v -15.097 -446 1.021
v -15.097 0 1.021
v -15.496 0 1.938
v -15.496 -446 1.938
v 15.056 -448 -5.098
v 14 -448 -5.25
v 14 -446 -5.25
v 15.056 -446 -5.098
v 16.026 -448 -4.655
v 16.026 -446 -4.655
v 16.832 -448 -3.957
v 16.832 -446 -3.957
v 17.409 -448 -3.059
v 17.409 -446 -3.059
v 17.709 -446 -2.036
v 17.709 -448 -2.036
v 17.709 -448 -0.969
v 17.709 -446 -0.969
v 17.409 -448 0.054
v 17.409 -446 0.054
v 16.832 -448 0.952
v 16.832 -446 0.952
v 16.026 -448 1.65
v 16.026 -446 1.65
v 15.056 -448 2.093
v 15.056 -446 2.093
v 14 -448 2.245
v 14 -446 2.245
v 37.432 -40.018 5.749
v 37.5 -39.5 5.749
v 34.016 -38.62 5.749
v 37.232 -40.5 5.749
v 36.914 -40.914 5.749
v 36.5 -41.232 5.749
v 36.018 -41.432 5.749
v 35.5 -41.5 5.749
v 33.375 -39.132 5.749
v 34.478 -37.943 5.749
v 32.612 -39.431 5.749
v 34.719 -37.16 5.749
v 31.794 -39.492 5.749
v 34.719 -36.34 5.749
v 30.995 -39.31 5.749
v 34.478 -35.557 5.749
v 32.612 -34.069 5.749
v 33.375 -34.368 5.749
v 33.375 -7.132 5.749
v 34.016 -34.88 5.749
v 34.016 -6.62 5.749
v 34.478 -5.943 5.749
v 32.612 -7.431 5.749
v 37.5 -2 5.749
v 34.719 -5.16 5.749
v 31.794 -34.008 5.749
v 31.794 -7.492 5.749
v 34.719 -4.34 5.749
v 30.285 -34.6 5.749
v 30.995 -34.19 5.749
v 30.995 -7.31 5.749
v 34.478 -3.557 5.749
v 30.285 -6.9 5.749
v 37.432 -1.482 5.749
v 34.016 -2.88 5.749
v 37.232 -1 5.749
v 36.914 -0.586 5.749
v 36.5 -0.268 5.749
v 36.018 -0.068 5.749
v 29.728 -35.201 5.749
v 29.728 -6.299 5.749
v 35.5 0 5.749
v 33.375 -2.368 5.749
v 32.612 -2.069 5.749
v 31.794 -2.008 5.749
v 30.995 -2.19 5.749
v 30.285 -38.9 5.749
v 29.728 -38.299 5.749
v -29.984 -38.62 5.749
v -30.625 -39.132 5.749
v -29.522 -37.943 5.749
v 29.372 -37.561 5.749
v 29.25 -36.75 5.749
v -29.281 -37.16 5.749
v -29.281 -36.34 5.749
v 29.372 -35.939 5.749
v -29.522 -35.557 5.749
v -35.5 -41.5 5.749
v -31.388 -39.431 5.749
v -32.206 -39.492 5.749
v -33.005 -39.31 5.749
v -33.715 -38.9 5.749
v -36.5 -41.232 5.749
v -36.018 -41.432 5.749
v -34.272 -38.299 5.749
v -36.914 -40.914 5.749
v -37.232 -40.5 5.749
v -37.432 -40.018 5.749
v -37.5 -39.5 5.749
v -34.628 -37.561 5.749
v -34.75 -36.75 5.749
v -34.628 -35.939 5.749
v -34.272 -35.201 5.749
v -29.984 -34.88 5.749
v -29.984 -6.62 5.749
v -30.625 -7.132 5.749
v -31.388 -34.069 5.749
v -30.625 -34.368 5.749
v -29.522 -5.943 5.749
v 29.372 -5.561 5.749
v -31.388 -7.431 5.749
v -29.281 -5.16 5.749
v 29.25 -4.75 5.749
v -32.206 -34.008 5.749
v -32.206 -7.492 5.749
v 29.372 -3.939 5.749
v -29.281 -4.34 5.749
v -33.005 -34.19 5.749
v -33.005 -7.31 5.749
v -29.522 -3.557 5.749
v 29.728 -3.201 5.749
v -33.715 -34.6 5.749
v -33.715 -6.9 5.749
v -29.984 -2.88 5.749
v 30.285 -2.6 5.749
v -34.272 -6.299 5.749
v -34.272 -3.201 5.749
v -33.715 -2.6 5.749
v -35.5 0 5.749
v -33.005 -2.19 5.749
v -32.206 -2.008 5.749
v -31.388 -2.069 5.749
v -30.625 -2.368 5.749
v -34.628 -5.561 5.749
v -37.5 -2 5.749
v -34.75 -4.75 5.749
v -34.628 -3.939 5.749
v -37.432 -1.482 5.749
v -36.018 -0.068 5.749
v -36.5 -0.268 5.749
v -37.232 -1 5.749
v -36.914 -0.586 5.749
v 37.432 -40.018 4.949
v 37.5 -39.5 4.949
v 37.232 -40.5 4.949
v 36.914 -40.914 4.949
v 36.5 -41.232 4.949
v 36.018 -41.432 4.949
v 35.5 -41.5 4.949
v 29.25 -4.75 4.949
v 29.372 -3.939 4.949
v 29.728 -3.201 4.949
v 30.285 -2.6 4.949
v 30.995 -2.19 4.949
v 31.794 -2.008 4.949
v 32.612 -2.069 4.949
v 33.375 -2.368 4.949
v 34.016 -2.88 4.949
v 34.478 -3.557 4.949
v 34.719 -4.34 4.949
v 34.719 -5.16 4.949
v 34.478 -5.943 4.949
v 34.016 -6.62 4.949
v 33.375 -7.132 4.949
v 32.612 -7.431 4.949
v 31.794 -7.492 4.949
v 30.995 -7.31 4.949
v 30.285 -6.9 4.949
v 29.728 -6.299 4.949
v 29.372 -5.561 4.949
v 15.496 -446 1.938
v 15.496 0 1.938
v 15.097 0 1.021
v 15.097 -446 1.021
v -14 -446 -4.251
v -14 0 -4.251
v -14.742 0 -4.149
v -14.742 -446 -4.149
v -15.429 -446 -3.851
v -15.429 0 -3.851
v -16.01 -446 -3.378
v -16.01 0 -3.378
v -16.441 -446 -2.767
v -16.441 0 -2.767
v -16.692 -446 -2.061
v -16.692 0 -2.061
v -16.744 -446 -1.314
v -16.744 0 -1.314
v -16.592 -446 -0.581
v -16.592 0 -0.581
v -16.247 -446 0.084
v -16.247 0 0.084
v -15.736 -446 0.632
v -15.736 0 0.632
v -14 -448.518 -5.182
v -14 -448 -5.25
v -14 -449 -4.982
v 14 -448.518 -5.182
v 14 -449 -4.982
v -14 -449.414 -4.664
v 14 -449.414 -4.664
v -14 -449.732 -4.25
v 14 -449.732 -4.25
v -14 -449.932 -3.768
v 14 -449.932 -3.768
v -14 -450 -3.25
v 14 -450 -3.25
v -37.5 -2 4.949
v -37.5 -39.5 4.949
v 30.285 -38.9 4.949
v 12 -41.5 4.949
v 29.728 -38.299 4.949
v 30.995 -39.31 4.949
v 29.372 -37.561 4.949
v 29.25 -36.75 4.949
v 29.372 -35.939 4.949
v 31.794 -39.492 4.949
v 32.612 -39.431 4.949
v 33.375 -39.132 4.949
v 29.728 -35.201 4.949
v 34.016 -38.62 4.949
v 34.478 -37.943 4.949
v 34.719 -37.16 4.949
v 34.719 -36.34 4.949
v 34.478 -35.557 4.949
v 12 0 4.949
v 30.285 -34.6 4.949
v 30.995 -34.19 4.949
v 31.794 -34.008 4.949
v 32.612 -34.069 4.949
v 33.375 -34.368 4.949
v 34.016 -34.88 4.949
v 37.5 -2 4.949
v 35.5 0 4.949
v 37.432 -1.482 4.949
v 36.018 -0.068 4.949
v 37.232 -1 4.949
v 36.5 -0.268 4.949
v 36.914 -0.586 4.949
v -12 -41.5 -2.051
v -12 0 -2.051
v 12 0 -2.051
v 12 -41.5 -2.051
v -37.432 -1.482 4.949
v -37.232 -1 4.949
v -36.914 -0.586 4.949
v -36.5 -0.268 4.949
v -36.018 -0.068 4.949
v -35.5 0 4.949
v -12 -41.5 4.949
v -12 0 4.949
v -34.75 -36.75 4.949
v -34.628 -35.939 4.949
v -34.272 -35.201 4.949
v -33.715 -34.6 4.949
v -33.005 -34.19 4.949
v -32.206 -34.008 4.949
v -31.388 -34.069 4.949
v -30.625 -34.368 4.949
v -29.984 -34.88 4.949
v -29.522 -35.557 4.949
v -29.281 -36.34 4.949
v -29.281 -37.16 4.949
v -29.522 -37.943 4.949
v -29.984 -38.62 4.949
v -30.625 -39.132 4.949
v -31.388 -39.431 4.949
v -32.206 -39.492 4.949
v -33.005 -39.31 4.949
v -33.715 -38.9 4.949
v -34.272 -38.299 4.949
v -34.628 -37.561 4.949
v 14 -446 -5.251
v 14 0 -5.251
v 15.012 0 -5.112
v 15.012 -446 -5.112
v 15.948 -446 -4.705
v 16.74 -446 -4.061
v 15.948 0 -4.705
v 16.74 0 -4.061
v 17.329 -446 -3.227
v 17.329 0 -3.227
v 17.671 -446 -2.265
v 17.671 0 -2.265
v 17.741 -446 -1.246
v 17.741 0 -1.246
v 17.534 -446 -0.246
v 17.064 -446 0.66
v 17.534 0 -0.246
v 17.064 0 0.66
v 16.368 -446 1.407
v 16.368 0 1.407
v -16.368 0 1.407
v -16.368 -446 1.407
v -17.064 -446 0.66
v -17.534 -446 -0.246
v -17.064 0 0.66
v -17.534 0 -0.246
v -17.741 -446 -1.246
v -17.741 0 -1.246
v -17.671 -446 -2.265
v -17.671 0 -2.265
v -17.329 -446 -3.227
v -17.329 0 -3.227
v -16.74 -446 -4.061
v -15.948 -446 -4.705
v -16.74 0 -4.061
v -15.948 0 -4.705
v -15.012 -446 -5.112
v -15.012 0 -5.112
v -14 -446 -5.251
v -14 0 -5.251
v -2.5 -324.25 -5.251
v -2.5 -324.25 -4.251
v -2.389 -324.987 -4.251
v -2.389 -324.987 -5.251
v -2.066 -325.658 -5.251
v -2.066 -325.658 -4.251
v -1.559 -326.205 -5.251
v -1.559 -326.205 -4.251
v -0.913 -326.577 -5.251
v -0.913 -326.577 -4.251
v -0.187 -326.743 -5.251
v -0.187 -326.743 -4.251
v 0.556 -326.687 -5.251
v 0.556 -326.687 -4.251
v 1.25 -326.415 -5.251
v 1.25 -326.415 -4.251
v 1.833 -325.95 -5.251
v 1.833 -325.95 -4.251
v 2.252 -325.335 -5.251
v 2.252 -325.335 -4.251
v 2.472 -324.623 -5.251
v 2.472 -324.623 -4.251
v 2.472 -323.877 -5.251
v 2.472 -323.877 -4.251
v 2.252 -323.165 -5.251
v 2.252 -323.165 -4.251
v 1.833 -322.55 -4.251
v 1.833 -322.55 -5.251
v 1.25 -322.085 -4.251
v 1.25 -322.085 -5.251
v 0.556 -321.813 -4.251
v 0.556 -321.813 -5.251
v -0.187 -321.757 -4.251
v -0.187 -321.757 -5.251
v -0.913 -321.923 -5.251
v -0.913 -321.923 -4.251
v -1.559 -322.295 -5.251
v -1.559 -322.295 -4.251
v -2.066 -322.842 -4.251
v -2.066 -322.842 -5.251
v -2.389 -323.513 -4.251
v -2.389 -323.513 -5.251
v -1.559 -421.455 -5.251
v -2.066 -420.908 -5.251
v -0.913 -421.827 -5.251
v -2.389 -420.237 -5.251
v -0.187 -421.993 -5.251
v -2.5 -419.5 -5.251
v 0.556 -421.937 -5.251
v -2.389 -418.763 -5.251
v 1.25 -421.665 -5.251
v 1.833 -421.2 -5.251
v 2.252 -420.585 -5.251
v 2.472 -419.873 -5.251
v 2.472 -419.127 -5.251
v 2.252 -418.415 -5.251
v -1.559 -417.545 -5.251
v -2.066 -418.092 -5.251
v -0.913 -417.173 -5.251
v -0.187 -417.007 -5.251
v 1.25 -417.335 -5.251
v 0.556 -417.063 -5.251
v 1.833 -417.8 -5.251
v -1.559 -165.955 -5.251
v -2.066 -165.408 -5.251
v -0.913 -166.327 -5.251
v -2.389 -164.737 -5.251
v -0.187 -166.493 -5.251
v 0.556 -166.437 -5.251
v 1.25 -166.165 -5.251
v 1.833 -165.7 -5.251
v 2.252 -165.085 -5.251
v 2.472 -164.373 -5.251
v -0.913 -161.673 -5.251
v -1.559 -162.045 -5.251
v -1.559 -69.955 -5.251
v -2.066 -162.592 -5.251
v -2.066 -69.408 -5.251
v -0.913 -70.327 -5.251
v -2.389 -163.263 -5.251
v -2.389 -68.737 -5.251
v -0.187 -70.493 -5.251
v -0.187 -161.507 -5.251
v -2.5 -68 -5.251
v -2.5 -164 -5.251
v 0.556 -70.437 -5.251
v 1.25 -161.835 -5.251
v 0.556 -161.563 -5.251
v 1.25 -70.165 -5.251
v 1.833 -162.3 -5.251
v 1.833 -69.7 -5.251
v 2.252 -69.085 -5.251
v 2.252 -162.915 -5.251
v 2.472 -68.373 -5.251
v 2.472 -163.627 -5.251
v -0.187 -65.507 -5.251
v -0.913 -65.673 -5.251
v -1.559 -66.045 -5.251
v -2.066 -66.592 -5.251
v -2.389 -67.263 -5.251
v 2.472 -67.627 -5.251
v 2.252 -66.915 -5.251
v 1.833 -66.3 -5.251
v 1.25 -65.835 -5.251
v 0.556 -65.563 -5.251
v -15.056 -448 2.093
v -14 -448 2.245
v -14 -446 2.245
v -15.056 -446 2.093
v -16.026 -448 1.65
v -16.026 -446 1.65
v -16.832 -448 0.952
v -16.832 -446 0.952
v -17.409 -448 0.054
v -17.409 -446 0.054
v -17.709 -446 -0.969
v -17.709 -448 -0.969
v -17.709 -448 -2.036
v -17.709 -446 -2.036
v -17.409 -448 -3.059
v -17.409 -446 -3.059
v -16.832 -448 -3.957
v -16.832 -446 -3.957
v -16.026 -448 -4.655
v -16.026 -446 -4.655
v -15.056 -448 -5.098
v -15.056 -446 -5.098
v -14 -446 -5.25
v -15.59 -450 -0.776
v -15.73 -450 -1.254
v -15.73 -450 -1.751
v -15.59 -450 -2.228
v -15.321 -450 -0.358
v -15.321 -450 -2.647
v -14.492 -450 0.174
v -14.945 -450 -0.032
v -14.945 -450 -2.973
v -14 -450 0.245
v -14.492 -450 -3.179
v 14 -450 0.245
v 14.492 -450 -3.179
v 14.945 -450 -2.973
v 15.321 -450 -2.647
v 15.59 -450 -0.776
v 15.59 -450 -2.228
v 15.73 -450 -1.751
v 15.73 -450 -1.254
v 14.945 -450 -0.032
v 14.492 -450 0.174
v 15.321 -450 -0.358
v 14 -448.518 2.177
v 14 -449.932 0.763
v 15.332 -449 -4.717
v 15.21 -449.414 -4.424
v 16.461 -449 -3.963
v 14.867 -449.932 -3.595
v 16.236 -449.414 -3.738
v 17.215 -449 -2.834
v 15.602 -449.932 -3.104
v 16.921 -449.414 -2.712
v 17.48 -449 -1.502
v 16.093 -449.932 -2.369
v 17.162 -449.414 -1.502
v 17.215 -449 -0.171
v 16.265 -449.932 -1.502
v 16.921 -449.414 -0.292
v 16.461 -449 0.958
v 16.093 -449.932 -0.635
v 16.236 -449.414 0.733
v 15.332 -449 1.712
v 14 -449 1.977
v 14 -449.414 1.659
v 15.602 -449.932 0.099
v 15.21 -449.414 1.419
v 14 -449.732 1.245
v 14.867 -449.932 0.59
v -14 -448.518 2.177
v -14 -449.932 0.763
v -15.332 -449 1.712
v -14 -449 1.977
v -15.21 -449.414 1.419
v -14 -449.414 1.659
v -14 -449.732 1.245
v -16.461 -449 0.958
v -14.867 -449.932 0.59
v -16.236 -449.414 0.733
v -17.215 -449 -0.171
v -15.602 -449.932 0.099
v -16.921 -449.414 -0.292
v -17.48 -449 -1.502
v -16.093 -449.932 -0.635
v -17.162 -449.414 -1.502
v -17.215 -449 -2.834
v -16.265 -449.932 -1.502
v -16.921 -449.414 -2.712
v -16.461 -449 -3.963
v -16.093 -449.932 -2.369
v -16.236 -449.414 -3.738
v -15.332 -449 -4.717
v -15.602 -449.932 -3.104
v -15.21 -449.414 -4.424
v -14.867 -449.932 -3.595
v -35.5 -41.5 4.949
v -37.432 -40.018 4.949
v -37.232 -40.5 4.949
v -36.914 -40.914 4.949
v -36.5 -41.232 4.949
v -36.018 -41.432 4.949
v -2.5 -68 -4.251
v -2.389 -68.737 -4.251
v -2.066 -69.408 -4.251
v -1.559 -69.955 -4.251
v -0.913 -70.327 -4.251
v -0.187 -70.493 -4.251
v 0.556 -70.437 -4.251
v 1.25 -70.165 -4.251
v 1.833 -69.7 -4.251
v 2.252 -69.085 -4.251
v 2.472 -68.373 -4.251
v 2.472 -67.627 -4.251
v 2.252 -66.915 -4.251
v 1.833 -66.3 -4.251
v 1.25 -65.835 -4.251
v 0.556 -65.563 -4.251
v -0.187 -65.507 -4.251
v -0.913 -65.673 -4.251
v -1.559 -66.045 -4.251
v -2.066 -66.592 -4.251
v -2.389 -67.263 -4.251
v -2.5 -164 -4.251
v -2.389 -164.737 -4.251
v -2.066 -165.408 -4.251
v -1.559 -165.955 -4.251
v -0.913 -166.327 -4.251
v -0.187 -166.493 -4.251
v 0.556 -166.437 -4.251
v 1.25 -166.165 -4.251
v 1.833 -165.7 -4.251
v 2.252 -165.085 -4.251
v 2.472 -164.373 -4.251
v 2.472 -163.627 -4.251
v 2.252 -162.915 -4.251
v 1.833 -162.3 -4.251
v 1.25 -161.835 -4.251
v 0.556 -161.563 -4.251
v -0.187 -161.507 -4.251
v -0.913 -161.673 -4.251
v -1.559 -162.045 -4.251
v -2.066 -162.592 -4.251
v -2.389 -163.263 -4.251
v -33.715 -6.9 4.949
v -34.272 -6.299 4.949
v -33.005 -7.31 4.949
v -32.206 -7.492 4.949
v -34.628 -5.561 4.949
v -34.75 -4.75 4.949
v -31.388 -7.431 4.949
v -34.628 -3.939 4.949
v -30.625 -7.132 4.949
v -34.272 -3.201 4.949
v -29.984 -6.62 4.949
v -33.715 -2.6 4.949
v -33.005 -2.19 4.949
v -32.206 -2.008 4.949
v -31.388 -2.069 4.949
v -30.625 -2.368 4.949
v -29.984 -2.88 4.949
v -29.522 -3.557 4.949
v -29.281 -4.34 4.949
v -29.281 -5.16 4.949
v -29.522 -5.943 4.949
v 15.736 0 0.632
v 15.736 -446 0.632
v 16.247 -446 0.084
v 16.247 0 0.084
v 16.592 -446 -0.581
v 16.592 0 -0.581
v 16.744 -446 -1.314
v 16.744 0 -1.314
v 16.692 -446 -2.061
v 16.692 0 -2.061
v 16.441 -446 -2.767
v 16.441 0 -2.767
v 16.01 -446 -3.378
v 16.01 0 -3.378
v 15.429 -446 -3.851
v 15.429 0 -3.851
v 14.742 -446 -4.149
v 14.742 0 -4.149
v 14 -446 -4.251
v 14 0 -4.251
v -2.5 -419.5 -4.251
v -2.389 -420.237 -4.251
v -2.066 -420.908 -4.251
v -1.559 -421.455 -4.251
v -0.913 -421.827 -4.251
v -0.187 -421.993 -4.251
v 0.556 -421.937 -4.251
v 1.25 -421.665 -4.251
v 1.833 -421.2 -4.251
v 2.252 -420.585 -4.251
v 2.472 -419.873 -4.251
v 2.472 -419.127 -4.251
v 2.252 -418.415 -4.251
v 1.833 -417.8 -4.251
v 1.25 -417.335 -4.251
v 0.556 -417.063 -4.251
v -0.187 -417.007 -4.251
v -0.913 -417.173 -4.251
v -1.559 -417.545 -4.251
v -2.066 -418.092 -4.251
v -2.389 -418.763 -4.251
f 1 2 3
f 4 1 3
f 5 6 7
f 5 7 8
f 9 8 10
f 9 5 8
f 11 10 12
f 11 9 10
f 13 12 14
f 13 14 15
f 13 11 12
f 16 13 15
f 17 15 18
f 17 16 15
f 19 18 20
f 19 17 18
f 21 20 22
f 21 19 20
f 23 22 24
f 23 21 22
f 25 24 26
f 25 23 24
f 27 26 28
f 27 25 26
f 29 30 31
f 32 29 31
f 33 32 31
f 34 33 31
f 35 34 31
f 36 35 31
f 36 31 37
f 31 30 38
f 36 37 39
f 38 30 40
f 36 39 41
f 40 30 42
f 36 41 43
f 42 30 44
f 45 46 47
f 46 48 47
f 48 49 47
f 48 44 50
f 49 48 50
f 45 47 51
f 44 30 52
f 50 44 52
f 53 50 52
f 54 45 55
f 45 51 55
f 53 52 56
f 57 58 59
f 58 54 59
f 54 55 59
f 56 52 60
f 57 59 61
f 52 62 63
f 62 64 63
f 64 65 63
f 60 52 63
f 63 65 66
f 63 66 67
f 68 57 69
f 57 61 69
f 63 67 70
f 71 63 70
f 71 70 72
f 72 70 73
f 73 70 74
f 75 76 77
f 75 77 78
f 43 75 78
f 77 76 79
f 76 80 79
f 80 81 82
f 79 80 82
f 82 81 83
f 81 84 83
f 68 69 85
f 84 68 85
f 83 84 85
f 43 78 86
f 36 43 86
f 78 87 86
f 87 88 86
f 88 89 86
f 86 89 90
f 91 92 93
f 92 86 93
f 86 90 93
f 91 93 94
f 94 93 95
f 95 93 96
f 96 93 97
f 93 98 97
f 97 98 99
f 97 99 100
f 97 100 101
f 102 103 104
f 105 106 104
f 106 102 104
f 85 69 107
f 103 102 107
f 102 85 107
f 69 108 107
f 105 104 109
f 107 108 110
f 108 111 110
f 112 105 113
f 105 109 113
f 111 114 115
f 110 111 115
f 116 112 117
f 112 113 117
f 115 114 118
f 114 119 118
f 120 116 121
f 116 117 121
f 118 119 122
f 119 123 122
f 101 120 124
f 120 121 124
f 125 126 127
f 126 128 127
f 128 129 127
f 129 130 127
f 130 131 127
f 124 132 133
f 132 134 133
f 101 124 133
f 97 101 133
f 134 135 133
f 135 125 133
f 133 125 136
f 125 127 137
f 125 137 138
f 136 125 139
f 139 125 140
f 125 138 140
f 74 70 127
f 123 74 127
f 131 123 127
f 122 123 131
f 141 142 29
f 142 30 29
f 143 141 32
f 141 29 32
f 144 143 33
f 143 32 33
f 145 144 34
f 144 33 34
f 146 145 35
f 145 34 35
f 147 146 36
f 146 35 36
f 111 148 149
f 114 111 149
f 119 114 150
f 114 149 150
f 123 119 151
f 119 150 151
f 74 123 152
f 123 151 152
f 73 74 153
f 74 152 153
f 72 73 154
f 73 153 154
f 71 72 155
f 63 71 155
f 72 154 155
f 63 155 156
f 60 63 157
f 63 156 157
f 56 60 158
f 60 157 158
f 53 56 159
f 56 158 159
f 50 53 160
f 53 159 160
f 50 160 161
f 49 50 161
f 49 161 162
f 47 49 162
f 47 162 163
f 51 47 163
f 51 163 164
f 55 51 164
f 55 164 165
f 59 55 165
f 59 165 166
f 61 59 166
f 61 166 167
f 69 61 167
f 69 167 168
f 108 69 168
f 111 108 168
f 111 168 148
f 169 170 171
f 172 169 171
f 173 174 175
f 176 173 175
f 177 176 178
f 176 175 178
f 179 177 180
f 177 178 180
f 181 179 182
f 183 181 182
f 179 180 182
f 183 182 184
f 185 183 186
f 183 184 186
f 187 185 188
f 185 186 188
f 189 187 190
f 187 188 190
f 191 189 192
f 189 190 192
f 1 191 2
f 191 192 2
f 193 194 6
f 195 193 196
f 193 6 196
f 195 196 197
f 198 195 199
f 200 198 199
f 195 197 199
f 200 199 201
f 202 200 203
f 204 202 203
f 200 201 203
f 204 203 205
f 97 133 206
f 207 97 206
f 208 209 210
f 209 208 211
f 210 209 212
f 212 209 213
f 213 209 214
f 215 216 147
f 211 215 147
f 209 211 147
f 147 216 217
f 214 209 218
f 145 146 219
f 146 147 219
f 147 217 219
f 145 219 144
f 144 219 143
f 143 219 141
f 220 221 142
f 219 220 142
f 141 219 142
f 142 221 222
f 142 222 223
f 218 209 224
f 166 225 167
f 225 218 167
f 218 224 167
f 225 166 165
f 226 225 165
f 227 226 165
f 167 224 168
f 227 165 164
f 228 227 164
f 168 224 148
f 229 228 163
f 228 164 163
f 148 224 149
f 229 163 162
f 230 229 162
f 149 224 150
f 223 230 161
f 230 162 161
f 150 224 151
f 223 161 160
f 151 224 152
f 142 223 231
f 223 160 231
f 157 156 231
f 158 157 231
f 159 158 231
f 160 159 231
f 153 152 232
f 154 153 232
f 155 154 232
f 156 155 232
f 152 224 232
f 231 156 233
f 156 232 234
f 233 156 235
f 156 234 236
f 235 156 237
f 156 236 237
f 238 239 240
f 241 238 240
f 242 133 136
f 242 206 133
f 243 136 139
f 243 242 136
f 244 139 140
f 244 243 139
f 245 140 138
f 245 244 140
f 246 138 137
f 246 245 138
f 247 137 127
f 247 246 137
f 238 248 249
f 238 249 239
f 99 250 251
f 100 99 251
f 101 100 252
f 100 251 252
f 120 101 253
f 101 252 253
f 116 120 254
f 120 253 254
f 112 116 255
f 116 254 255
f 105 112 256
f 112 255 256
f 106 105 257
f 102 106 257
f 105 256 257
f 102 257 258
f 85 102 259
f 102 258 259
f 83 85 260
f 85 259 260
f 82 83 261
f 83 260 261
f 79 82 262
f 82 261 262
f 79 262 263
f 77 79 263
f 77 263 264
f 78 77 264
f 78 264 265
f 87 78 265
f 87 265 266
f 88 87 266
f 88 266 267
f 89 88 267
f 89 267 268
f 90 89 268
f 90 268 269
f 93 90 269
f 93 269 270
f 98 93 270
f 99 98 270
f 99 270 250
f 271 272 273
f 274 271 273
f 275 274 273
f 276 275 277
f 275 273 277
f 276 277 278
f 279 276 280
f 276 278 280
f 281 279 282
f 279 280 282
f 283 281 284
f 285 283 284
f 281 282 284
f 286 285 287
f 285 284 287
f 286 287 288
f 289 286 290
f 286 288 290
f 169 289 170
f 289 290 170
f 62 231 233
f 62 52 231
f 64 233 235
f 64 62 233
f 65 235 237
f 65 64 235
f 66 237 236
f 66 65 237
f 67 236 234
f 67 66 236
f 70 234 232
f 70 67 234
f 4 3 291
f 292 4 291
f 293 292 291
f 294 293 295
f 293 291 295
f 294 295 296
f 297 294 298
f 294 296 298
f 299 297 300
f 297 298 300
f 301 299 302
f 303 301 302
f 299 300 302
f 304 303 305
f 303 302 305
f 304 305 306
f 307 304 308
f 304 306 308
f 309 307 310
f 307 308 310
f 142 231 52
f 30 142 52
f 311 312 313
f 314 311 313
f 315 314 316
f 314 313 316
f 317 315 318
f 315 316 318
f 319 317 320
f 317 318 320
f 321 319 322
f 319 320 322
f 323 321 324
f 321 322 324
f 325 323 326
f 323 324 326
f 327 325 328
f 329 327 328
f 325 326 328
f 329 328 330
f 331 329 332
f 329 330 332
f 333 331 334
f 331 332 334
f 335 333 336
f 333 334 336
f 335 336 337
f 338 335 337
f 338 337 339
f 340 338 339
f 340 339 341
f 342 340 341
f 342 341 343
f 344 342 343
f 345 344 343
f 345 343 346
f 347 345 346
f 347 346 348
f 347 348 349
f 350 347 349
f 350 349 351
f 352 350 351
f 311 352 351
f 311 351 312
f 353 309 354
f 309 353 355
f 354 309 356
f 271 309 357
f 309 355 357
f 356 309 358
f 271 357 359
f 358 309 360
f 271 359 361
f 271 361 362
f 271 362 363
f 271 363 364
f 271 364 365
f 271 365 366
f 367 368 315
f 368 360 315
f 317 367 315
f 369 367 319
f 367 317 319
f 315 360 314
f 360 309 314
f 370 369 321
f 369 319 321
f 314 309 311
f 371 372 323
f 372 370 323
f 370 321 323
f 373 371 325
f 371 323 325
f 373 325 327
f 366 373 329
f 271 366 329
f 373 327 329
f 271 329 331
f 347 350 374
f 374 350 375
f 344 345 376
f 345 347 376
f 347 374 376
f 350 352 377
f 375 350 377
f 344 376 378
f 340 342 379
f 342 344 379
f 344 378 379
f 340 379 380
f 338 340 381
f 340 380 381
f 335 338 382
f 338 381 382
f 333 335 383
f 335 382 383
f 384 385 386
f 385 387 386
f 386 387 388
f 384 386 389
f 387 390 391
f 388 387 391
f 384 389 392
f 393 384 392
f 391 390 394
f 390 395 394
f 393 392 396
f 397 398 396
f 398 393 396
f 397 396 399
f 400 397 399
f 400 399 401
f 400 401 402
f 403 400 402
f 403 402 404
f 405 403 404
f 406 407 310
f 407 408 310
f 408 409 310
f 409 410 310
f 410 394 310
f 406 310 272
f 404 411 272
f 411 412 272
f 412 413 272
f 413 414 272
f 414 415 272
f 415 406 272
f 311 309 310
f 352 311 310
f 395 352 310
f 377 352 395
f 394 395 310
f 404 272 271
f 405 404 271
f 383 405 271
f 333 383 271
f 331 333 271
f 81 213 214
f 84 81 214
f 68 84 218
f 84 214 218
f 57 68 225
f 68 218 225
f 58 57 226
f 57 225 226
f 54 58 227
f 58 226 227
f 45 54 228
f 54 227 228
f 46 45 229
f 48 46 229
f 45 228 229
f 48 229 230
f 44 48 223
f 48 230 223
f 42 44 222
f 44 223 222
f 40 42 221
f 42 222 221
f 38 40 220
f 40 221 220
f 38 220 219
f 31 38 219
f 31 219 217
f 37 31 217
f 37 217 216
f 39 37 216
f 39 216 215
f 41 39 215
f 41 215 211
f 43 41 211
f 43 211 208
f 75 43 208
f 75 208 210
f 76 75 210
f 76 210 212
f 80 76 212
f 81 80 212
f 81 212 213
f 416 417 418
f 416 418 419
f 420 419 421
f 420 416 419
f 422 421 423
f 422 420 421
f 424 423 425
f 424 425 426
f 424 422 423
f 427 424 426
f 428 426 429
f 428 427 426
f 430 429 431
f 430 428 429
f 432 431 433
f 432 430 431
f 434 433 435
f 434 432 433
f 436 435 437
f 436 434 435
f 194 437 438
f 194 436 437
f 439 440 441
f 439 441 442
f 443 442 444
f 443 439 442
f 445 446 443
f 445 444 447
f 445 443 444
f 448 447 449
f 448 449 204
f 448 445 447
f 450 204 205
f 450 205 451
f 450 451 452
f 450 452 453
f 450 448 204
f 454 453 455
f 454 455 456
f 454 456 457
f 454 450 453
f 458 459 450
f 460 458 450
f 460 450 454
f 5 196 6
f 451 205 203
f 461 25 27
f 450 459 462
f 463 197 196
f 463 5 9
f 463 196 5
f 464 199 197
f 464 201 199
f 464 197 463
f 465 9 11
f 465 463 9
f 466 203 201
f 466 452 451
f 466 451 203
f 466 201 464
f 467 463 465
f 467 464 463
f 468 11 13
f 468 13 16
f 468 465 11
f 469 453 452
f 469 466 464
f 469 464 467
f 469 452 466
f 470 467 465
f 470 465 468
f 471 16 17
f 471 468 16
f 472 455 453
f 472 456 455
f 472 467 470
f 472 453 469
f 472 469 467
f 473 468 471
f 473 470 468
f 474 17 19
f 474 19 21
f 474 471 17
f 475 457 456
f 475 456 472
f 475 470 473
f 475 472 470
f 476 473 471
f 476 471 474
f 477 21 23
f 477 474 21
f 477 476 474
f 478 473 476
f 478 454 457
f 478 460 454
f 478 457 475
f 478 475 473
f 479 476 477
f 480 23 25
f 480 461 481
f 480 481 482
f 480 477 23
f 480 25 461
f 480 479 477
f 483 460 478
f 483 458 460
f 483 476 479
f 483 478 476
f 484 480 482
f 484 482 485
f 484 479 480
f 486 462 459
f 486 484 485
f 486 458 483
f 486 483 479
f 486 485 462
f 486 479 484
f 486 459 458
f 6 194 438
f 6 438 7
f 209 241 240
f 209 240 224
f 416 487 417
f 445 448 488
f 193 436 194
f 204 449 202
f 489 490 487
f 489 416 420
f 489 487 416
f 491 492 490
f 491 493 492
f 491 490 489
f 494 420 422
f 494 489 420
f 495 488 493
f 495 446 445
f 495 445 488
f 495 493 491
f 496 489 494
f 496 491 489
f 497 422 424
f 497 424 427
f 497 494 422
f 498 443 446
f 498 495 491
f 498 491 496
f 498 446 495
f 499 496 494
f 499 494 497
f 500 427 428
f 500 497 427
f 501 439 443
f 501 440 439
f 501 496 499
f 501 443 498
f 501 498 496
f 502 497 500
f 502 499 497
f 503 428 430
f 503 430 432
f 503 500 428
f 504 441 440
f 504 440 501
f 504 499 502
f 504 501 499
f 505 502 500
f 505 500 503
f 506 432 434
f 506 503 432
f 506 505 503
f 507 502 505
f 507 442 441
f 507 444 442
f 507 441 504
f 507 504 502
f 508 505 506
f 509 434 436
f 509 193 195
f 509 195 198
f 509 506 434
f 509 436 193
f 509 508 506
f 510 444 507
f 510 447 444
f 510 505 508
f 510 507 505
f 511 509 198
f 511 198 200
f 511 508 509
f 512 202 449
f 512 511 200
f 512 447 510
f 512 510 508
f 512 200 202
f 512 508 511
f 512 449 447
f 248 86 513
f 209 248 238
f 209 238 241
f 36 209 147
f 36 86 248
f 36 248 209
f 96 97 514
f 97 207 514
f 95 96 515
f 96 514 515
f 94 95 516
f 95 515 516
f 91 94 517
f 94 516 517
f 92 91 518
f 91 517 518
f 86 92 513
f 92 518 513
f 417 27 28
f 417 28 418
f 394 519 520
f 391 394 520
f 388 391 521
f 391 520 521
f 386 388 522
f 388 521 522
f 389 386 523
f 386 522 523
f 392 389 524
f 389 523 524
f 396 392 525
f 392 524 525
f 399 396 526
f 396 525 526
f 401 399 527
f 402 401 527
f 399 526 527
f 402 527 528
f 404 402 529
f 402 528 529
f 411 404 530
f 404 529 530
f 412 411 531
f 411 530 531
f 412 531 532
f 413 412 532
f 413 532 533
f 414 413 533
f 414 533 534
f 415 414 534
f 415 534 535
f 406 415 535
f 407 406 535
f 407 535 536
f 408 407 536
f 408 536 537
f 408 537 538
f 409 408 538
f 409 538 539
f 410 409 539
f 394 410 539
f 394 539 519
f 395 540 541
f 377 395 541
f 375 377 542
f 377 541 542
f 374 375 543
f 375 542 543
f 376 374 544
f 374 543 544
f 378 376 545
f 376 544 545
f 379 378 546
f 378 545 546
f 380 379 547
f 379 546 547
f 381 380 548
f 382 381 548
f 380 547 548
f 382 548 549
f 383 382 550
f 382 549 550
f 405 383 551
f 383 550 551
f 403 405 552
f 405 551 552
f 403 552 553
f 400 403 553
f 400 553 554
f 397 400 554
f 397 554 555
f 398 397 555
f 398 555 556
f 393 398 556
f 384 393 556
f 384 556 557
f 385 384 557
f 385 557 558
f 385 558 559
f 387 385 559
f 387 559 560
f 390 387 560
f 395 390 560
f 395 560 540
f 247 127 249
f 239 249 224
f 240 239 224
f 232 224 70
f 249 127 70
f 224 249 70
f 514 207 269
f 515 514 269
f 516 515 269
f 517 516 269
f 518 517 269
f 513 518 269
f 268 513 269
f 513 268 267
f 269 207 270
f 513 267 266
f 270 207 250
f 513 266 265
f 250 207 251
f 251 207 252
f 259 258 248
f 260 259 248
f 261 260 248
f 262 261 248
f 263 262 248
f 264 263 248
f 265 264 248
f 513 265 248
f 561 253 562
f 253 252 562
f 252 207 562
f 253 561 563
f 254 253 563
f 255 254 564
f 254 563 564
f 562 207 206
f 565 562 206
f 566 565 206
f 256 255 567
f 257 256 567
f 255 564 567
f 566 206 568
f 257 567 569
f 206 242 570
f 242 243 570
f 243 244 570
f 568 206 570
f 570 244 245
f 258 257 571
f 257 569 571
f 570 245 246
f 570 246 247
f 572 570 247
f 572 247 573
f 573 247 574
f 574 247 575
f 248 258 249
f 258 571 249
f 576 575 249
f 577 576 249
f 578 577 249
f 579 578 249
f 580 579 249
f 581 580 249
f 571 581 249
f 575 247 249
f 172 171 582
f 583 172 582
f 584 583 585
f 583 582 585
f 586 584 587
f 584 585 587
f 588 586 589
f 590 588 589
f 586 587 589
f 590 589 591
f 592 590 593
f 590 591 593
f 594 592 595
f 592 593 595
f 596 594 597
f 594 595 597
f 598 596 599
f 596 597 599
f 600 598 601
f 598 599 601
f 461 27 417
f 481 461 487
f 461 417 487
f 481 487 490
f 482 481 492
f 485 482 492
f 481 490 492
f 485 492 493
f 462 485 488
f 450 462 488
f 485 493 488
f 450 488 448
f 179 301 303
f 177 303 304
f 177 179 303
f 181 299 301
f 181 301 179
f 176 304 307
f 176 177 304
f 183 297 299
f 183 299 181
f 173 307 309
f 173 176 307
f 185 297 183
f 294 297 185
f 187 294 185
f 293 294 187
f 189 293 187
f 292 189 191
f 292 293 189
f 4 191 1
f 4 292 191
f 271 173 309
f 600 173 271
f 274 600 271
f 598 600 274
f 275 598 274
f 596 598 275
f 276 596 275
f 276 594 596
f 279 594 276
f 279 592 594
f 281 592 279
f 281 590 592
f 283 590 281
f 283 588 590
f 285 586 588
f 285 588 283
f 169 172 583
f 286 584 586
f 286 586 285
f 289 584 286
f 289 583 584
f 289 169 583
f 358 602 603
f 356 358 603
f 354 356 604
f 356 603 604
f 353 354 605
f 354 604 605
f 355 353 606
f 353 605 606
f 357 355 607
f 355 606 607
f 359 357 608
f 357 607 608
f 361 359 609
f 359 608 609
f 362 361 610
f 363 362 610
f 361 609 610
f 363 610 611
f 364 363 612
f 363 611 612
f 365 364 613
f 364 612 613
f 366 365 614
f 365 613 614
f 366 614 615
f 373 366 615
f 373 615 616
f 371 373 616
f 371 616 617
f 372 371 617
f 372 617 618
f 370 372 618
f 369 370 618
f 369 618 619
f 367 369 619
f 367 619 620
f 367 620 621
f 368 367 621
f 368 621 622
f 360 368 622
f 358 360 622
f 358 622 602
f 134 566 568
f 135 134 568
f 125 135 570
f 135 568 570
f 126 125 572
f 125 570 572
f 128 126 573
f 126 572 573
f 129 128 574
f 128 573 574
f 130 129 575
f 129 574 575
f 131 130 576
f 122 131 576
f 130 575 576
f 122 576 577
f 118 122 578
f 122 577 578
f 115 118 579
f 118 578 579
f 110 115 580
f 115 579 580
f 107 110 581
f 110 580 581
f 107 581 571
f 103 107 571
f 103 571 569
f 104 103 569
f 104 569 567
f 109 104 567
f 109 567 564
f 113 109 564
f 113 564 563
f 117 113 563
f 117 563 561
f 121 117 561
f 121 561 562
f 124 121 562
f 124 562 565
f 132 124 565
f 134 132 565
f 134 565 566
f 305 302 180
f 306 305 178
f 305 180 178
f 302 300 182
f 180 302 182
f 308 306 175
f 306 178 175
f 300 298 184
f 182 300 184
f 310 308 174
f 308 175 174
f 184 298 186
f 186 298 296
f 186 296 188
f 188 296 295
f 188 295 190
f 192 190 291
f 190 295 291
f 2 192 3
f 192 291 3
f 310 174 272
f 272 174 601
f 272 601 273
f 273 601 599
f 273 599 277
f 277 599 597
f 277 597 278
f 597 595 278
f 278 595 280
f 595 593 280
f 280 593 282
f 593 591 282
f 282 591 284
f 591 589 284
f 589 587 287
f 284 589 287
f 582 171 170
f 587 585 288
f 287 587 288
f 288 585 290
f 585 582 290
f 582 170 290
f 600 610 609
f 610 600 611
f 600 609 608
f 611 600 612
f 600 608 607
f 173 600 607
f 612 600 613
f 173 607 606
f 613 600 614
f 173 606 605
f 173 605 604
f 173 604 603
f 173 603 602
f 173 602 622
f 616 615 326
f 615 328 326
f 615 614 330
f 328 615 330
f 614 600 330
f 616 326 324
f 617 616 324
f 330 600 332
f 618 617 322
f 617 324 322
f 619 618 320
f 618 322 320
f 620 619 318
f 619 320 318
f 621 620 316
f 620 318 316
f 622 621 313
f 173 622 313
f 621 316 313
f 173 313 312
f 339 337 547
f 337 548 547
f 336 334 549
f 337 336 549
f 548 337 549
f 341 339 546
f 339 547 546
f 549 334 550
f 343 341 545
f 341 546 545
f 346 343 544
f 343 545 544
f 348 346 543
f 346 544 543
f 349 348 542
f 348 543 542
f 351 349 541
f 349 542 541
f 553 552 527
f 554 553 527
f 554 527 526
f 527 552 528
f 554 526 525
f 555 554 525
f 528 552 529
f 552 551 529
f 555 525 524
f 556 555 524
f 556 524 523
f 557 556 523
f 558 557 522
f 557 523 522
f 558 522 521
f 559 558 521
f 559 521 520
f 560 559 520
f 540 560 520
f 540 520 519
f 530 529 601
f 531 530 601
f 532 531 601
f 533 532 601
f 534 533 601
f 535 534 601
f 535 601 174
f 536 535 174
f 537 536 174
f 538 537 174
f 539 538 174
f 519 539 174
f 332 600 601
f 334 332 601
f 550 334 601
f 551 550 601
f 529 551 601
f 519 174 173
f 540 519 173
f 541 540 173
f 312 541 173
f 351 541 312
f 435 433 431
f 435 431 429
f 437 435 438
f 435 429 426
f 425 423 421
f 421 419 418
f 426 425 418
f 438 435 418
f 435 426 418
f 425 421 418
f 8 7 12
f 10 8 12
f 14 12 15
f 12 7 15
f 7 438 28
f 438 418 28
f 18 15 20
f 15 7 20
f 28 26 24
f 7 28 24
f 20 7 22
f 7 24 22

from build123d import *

# Parameters (mm, degrees)
F2_DEPTH  = 41.5
F3_R      = 2
F4_DEPTH  = 446
F7_D      = 5.5
F7_DEPTH  = 7.5
F7_TIP    = 1.6523667023
F8_D      = 5
F8_DEPTH  = 7.5
F8_TIP    = 1.5021515476
F10_DEPTH = 4
F12_R     = 2


with BuildPart() as f2:
    # F1 (on Front) → F2 (new body)
    with BuildSketch(Plane.XZ):
        Polygon((0, 5.749096056), (-37.5, 5.749096056), (-37.5, 4.949096056), (-12, 4.949096056), (-12, -2.050903944), (0, -2.050903944), (12, -2.050903944), (12, 4.949096056), (37.5, 4.949096056), (37.5, 5.749096056), align=None)
    extrude(amount=F2_DEPTH)

    # F3
    f3_edges = [f2.edges().sort_by_distance(p)[0] for p in [
        (37.5, 0, 5.349096),
        (-37.5, 0, 5.349096),
        (-37.5, -41.5, 5.349096),
        (37.5, -41.5, 5.349096),
    ]]
    fillet(f3_edges, radius=F3_R)

    # F7
    with Locations(Plane.XY.offset(5.749096056)):
        with Locations((-32, -4.75), (-32, -36.75), (32, -36.75), (32, -4.75)):
            Hole(F7_D / 2, depth=F7_DEPTH)
            with Locations((0, 0, -(F7_DEPTH + F7_TIP / 2))):  # 118° drill point
                Cone(0, F7_D / 2, F7_TIP, mode=Mode.SUBTRACT)


with BuildPart() as f4:
    # F0 (on Front) → F4 (new body)
    with BuildSketch(Plane.XZ):
        with BuildLine():
            Line((-14, -5.250903944), (0, -5.250903944))
            Line((0, -5.250903944), (14, -5.250903944))
            ThreePointArc((14, -5.250903944), (17.6713815838, -2.2647476886), (15.4956596571, 1.9379188474))
            Line((15.4956596571, 1.9379188474), (15.0968170818, 1.0208994364))
            ThreePointArc((15.0968170818, 1.0208994364), (16.6923464948, -2.0610560234), (14, -4.250903944))
            Line((14, -4.250903944), (-14, -4.250903944))
            ThreePointArc((-14, -4.250903944), (-16.6923464948, -2.0610560234), (-15.0968170818, 1.0208994364))
            Line((-15.0968170818, 1.0208994364), (-15.4956596571, 1.9379188474))
            ThreePointArc((-15.4956596571, 1.9379188474), (-17.6713815838, -2.2647476886), (-14, -5.250903944))
        make_face()
    extrude(amount=F4_DEPTH)

    # F8
    with Locations(Plane(origin=(0, 0, -5.250903944), x_dir=(1, 0, 0), z_dir=(0, 0, -1))):
        with Locations((0, 68), (0, 164), (0, 419.5), (0, 324.25)):
            Hole(F8_D / 2, depth=F8_DEPTH)
            with Locations((0, 0, -(F8_DEPTH + F8_TIP / 2))):  # 118° drill point
                Cone(0, F8_D / 2, F8_TIP, mode=Mode.SUBTRACT)


with BuildPart() as f10:
    # F9 (on Front) → F10 (new body)
    with BuildSketch(Plane.XZ):
        with BuildLine():
            ThreePointArc((-14.0000004321, 2.2452578414), (-17.7476290846, -1.5023708111), (-14.0000004321, -5.2499994636))
            Line((-14.0000004321, -5.2499994636), (13.9999995679, -5.2499994636))
            ThreePointArc((13.9999995679, -5.2499994636), (17.7476282204, -1.5023708111), (13.9999995679, 2.2452578414))
            Line((13.9999995679, 2.2452578414), (-14.0000004321, 2.2452578414))
        make_face()
    extrude(amount=-F10_DEPTH)


with BuildPart() as f10_1:
    # F11: moved
    add(f10.part.moved(Location((0, -450, 0))))

    # F12
    f12_edges = [f10_1.edges().sort_by_distance(p)[0] for p in [
        (-17.747629, -450, -1.502371),
        (0, -450, -5.249999),
        (17.747628, -450, -1.502371),
        (0, -450, 2.245258),
    ]]
    fillet(f12_edges, radius=F12_R)


solid = Compound([f2.part, f4.part, f10_1.part])
